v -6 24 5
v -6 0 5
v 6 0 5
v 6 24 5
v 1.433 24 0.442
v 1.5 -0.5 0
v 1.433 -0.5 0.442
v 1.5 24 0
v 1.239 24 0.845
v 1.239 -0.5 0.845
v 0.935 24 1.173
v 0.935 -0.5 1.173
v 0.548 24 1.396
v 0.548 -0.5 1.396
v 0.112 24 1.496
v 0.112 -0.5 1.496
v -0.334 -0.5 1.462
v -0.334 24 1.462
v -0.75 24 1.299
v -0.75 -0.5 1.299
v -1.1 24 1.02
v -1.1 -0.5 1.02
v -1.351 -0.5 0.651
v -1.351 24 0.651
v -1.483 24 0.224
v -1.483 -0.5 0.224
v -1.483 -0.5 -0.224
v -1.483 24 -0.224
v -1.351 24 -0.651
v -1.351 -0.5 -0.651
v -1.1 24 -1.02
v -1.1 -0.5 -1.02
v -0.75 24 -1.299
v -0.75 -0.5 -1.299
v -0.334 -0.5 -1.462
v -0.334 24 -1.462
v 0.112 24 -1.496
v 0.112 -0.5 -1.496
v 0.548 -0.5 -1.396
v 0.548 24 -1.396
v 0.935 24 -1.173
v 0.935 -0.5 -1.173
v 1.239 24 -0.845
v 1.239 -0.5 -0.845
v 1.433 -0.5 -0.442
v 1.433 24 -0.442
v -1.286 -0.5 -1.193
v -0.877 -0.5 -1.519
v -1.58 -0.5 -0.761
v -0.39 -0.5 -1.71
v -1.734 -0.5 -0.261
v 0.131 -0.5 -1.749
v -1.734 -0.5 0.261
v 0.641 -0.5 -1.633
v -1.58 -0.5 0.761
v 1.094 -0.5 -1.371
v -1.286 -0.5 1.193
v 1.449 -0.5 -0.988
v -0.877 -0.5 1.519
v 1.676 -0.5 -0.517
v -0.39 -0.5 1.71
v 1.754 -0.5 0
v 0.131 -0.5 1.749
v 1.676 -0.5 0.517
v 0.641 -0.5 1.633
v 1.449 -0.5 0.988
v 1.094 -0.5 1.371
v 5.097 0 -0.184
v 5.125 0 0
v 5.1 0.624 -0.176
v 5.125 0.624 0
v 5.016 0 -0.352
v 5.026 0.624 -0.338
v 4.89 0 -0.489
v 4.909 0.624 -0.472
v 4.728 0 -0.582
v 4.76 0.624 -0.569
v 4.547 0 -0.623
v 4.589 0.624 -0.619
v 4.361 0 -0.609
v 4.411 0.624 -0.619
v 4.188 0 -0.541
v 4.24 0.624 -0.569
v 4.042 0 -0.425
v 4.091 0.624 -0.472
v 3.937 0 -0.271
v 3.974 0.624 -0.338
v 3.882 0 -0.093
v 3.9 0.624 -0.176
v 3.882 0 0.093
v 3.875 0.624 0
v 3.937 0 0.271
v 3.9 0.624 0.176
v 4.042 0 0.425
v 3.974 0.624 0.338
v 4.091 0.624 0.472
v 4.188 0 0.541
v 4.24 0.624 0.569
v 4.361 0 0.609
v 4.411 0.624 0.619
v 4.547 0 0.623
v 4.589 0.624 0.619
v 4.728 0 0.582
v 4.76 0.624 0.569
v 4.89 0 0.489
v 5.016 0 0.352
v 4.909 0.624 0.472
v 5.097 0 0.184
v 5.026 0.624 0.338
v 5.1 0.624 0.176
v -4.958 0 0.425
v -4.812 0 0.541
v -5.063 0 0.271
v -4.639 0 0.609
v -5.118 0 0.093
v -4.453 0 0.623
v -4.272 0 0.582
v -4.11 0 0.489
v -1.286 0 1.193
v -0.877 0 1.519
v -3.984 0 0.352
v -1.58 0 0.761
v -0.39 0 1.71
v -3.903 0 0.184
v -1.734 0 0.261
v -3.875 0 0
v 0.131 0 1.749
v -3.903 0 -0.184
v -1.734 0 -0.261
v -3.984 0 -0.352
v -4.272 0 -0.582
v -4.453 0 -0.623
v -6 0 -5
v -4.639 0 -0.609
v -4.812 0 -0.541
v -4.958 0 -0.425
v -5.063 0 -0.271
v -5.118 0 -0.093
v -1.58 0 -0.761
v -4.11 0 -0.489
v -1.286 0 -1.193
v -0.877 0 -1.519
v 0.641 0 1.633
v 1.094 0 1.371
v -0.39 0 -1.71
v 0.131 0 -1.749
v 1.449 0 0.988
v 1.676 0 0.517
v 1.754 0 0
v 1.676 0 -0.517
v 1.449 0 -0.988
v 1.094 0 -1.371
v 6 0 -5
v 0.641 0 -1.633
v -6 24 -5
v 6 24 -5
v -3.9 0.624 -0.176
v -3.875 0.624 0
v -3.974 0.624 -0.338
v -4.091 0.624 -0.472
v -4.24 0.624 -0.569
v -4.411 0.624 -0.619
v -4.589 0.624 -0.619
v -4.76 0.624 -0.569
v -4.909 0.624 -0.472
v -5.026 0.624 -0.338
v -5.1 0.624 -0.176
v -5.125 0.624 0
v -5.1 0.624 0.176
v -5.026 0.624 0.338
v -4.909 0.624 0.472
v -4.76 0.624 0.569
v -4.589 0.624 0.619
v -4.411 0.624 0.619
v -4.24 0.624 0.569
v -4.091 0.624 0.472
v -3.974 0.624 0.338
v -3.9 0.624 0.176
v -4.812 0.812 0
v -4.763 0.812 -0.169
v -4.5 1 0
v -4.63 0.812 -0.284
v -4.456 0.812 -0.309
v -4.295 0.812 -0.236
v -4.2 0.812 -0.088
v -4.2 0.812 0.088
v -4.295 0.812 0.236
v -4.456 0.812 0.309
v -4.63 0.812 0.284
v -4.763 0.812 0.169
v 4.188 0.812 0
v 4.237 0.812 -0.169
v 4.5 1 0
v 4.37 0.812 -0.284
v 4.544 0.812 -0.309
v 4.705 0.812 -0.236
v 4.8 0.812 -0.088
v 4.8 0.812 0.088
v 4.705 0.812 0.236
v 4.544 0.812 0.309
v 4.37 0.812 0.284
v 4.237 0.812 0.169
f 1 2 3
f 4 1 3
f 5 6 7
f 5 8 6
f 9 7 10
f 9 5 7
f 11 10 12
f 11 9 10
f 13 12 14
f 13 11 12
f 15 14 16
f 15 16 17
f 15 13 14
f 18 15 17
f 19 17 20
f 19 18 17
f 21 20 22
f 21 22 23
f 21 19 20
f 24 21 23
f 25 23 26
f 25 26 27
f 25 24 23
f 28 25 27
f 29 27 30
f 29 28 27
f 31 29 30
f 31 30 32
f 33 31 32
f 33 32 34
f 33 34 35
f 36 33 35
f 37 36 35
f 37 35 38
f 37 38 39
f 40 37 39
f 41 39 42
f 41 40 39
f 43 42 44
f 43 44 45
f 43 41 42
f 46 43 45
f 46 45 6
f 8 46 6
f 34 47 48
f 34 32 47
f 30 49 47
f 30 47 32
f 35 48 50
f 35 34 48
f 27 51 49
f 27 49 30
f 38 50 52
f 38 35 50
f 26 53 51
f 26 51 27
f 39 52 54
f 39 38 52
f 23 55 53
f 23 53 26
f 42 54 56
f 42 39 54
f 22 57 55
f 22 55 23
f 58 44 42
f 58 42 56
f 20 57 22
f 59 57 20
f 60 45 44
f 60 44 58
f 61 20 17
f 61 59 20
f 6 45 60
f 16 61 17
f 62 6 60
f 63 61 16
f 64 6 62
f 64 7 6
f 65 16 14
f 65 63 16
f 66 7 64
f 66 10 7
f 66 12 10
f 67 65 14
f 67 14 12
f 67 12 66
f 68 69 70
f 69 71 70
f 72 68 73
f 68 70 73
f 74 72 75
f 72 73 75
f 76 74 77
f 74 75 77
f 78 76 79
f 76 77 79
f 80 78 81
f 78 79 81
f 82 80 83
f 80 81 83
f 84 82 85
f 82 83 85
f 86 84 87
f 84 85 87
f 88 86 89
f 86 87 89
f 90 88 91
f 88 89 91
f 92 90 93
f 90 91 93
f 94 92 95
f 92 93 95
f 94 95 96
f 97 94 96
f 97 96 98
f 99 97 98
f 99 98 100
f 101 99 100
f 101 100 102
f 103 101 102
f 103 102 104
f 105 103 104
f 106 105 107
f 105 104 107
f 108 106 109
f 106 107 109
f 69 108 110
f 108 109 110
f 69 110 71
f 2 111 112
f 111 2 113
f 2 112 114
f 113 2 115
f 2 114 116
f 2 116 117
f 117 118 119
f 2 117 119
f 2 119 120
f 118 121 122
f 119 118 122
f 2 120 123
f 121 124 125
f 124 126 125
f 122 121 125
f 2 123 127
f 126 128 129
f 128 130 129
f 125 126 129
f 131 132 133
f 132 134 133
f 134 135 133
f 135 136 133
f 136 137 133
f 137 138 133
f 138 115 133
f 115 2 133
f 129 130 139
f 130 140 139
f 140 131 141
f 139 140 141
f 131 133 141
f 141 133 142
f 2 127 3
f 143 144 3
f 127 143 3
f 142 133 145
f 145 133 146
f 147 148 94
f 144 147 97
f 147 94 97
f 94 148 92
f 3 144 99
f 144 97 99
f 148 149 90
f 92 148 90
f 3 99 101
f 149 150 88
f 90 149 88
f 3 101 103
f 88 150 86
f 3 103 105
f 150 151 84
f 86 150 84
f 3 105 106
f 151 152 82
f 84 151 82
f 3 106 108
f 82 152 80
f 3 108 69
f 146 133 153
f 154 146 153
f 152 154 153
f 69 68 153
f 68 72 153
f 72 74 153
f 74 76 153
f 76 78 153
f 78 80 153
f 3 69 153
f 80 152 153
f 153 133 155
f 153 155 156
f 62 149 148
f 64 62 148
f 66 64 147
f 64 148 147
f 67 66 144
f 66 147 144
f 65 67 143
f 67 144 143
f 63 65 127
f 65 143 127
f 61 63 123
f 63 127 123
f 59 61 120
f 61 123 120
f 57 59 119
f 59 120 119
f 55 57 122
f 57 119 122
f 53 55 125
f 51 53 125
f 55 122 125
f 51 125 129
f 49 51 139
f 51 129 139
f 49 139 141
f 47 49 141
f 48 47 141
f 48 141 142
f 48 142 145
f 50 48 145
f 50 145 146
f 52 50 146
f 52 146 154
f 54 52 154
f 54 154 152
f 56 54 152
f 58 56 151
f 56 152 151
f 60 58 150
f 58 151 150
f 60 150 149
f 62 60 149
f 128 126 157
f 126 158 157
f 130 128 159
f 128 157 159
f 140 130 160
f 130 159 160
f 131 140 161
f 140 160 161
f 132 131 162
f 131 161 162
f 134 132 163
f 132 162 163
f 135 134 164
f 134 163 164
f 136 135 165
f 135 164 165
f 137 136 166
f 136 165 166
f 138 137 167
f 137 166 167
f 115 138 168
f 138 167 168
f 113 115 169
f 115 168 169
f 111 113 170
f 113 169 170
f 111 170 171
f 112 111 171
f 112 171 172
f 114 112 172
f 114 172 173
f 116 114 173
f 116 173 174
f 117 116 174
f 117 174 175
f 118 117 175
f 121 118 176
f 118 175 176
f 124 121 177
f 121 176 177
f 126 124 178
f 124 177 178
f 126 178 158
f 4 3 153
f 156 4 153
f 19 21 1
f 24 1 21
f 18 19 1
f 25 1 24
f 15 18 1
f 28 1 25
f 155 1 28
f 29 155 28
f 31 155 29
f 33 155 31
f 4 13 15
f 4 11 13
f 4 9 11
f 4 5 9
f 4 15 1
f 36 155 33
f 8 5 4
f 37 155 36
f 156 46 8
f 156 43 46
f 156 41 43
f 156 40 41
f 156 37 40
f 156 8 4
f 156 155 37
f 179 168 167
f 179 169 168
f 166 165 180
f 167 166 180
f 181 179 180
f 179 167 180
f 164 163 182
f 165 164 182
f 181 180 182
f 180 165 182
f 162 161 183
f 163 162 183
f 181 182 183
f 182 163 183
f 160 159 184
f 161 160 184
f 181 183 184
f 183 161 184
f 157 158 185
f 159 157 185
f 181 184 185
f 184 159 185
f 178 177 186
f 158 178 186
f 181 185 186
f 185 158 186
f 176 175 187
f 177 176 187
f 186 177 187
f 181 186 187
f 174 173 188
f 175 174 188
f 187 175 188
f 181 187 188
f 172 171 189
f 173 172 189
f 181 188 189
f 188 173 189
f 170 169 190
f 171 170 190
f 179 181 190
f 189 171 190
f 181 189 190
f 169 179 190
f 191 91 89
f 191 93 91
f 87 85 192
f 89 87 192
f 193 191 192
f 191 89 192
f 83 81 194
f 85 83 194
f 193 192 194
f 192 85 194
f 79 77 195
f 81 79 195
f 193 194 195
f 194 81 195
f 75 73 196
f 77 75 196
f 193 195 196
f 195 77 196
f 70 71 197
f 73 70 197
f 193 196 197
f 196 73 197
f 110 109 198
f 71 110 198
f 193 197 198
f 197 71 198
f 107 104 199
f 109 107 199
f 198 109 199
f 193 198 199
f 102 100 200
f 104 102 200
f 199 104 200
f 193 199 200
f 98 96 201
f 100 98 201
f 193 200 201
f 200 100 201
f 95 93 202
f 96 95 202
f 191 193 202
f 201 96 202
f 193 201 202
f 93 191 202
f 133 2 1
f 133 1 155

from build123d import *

# Parameters (mm, degrees)
SKETCH1_W                          = 12
SKETCH1_H                          = 10
SKETCH1_R                          = 1.5
BOSS_EXTRUDE1_DEPTH                = 24
SKETCH2_R                          = 1.754
SKETCH2_R_2                        = 1.5
BOSS_EXTRUDE2_DEPTH                = 0.5
TAP_DRILL_FOR_M1_6X0_35_TAP1_D     = 1.25
TAP_DRILL_FOR_M1_6X0_35_TAP1_DEPTH = 0.624460113
TAP_DRILL_FOR_M1_6X0_35_TAP1_TIP   = 0.375537887


with BuildPart() as part:
    # Sketch1 → Boss-Extrude1 (new body)
    with BuildSketch(Plane(origin=(0, 0, 0), x_dir=(1, 0, 0), z_dir=(0, 1, 0))):
        Rectangle(SKETCH1_W, SKETCH1_H)
        Circle(SKETCH1_R, mode=Mode.SUBTRACT)
    extrude(amount=BOSS_EXTRUDE1_DEPTH)

    # Sketch2 → Boss-Extrude2 (add)
    with BuildSketch(Plane.XZ):
        Circle(SKETCH2_R)
        Circle(SKETCH2_R_2, mode=Mode.SUBTRACT)
    extrude(amount=BOSS_EXTRUDE2_DEPTH)

    # Tap Drill for M1.6x0.35 Tap1
    with Locations(Plane(origin=(0, 0, 0), x_dir=(-1, 0, 0), z_dir=(0, -1, 0))):
        with Locations((-4.5, 0), (4.5, 0)):
            Hole(TAP_DRILL_FOR_M1_6X0_35_TAP1_D / 2, depth=TAP_DRILL_FOR_M1_6X0_35_TAP1_DEPTH)
            with Locations((0, 0, -(TAP_DRILL_FOR_M1_6X0_35_TAP1_DEPTH + TAP_DRILL_FOR_M1_6X0_35_TAP1_TIP / 2))):  # 118° drill point
                Cone(0, TAP_DRILL_FOR_M1_6X0_35_TAP1_D / 2, TAP_DRILL_FOR_M1_6X0_35_TAP1_TIP, mode=Mode.SUBTRACT)


solid = part.part
